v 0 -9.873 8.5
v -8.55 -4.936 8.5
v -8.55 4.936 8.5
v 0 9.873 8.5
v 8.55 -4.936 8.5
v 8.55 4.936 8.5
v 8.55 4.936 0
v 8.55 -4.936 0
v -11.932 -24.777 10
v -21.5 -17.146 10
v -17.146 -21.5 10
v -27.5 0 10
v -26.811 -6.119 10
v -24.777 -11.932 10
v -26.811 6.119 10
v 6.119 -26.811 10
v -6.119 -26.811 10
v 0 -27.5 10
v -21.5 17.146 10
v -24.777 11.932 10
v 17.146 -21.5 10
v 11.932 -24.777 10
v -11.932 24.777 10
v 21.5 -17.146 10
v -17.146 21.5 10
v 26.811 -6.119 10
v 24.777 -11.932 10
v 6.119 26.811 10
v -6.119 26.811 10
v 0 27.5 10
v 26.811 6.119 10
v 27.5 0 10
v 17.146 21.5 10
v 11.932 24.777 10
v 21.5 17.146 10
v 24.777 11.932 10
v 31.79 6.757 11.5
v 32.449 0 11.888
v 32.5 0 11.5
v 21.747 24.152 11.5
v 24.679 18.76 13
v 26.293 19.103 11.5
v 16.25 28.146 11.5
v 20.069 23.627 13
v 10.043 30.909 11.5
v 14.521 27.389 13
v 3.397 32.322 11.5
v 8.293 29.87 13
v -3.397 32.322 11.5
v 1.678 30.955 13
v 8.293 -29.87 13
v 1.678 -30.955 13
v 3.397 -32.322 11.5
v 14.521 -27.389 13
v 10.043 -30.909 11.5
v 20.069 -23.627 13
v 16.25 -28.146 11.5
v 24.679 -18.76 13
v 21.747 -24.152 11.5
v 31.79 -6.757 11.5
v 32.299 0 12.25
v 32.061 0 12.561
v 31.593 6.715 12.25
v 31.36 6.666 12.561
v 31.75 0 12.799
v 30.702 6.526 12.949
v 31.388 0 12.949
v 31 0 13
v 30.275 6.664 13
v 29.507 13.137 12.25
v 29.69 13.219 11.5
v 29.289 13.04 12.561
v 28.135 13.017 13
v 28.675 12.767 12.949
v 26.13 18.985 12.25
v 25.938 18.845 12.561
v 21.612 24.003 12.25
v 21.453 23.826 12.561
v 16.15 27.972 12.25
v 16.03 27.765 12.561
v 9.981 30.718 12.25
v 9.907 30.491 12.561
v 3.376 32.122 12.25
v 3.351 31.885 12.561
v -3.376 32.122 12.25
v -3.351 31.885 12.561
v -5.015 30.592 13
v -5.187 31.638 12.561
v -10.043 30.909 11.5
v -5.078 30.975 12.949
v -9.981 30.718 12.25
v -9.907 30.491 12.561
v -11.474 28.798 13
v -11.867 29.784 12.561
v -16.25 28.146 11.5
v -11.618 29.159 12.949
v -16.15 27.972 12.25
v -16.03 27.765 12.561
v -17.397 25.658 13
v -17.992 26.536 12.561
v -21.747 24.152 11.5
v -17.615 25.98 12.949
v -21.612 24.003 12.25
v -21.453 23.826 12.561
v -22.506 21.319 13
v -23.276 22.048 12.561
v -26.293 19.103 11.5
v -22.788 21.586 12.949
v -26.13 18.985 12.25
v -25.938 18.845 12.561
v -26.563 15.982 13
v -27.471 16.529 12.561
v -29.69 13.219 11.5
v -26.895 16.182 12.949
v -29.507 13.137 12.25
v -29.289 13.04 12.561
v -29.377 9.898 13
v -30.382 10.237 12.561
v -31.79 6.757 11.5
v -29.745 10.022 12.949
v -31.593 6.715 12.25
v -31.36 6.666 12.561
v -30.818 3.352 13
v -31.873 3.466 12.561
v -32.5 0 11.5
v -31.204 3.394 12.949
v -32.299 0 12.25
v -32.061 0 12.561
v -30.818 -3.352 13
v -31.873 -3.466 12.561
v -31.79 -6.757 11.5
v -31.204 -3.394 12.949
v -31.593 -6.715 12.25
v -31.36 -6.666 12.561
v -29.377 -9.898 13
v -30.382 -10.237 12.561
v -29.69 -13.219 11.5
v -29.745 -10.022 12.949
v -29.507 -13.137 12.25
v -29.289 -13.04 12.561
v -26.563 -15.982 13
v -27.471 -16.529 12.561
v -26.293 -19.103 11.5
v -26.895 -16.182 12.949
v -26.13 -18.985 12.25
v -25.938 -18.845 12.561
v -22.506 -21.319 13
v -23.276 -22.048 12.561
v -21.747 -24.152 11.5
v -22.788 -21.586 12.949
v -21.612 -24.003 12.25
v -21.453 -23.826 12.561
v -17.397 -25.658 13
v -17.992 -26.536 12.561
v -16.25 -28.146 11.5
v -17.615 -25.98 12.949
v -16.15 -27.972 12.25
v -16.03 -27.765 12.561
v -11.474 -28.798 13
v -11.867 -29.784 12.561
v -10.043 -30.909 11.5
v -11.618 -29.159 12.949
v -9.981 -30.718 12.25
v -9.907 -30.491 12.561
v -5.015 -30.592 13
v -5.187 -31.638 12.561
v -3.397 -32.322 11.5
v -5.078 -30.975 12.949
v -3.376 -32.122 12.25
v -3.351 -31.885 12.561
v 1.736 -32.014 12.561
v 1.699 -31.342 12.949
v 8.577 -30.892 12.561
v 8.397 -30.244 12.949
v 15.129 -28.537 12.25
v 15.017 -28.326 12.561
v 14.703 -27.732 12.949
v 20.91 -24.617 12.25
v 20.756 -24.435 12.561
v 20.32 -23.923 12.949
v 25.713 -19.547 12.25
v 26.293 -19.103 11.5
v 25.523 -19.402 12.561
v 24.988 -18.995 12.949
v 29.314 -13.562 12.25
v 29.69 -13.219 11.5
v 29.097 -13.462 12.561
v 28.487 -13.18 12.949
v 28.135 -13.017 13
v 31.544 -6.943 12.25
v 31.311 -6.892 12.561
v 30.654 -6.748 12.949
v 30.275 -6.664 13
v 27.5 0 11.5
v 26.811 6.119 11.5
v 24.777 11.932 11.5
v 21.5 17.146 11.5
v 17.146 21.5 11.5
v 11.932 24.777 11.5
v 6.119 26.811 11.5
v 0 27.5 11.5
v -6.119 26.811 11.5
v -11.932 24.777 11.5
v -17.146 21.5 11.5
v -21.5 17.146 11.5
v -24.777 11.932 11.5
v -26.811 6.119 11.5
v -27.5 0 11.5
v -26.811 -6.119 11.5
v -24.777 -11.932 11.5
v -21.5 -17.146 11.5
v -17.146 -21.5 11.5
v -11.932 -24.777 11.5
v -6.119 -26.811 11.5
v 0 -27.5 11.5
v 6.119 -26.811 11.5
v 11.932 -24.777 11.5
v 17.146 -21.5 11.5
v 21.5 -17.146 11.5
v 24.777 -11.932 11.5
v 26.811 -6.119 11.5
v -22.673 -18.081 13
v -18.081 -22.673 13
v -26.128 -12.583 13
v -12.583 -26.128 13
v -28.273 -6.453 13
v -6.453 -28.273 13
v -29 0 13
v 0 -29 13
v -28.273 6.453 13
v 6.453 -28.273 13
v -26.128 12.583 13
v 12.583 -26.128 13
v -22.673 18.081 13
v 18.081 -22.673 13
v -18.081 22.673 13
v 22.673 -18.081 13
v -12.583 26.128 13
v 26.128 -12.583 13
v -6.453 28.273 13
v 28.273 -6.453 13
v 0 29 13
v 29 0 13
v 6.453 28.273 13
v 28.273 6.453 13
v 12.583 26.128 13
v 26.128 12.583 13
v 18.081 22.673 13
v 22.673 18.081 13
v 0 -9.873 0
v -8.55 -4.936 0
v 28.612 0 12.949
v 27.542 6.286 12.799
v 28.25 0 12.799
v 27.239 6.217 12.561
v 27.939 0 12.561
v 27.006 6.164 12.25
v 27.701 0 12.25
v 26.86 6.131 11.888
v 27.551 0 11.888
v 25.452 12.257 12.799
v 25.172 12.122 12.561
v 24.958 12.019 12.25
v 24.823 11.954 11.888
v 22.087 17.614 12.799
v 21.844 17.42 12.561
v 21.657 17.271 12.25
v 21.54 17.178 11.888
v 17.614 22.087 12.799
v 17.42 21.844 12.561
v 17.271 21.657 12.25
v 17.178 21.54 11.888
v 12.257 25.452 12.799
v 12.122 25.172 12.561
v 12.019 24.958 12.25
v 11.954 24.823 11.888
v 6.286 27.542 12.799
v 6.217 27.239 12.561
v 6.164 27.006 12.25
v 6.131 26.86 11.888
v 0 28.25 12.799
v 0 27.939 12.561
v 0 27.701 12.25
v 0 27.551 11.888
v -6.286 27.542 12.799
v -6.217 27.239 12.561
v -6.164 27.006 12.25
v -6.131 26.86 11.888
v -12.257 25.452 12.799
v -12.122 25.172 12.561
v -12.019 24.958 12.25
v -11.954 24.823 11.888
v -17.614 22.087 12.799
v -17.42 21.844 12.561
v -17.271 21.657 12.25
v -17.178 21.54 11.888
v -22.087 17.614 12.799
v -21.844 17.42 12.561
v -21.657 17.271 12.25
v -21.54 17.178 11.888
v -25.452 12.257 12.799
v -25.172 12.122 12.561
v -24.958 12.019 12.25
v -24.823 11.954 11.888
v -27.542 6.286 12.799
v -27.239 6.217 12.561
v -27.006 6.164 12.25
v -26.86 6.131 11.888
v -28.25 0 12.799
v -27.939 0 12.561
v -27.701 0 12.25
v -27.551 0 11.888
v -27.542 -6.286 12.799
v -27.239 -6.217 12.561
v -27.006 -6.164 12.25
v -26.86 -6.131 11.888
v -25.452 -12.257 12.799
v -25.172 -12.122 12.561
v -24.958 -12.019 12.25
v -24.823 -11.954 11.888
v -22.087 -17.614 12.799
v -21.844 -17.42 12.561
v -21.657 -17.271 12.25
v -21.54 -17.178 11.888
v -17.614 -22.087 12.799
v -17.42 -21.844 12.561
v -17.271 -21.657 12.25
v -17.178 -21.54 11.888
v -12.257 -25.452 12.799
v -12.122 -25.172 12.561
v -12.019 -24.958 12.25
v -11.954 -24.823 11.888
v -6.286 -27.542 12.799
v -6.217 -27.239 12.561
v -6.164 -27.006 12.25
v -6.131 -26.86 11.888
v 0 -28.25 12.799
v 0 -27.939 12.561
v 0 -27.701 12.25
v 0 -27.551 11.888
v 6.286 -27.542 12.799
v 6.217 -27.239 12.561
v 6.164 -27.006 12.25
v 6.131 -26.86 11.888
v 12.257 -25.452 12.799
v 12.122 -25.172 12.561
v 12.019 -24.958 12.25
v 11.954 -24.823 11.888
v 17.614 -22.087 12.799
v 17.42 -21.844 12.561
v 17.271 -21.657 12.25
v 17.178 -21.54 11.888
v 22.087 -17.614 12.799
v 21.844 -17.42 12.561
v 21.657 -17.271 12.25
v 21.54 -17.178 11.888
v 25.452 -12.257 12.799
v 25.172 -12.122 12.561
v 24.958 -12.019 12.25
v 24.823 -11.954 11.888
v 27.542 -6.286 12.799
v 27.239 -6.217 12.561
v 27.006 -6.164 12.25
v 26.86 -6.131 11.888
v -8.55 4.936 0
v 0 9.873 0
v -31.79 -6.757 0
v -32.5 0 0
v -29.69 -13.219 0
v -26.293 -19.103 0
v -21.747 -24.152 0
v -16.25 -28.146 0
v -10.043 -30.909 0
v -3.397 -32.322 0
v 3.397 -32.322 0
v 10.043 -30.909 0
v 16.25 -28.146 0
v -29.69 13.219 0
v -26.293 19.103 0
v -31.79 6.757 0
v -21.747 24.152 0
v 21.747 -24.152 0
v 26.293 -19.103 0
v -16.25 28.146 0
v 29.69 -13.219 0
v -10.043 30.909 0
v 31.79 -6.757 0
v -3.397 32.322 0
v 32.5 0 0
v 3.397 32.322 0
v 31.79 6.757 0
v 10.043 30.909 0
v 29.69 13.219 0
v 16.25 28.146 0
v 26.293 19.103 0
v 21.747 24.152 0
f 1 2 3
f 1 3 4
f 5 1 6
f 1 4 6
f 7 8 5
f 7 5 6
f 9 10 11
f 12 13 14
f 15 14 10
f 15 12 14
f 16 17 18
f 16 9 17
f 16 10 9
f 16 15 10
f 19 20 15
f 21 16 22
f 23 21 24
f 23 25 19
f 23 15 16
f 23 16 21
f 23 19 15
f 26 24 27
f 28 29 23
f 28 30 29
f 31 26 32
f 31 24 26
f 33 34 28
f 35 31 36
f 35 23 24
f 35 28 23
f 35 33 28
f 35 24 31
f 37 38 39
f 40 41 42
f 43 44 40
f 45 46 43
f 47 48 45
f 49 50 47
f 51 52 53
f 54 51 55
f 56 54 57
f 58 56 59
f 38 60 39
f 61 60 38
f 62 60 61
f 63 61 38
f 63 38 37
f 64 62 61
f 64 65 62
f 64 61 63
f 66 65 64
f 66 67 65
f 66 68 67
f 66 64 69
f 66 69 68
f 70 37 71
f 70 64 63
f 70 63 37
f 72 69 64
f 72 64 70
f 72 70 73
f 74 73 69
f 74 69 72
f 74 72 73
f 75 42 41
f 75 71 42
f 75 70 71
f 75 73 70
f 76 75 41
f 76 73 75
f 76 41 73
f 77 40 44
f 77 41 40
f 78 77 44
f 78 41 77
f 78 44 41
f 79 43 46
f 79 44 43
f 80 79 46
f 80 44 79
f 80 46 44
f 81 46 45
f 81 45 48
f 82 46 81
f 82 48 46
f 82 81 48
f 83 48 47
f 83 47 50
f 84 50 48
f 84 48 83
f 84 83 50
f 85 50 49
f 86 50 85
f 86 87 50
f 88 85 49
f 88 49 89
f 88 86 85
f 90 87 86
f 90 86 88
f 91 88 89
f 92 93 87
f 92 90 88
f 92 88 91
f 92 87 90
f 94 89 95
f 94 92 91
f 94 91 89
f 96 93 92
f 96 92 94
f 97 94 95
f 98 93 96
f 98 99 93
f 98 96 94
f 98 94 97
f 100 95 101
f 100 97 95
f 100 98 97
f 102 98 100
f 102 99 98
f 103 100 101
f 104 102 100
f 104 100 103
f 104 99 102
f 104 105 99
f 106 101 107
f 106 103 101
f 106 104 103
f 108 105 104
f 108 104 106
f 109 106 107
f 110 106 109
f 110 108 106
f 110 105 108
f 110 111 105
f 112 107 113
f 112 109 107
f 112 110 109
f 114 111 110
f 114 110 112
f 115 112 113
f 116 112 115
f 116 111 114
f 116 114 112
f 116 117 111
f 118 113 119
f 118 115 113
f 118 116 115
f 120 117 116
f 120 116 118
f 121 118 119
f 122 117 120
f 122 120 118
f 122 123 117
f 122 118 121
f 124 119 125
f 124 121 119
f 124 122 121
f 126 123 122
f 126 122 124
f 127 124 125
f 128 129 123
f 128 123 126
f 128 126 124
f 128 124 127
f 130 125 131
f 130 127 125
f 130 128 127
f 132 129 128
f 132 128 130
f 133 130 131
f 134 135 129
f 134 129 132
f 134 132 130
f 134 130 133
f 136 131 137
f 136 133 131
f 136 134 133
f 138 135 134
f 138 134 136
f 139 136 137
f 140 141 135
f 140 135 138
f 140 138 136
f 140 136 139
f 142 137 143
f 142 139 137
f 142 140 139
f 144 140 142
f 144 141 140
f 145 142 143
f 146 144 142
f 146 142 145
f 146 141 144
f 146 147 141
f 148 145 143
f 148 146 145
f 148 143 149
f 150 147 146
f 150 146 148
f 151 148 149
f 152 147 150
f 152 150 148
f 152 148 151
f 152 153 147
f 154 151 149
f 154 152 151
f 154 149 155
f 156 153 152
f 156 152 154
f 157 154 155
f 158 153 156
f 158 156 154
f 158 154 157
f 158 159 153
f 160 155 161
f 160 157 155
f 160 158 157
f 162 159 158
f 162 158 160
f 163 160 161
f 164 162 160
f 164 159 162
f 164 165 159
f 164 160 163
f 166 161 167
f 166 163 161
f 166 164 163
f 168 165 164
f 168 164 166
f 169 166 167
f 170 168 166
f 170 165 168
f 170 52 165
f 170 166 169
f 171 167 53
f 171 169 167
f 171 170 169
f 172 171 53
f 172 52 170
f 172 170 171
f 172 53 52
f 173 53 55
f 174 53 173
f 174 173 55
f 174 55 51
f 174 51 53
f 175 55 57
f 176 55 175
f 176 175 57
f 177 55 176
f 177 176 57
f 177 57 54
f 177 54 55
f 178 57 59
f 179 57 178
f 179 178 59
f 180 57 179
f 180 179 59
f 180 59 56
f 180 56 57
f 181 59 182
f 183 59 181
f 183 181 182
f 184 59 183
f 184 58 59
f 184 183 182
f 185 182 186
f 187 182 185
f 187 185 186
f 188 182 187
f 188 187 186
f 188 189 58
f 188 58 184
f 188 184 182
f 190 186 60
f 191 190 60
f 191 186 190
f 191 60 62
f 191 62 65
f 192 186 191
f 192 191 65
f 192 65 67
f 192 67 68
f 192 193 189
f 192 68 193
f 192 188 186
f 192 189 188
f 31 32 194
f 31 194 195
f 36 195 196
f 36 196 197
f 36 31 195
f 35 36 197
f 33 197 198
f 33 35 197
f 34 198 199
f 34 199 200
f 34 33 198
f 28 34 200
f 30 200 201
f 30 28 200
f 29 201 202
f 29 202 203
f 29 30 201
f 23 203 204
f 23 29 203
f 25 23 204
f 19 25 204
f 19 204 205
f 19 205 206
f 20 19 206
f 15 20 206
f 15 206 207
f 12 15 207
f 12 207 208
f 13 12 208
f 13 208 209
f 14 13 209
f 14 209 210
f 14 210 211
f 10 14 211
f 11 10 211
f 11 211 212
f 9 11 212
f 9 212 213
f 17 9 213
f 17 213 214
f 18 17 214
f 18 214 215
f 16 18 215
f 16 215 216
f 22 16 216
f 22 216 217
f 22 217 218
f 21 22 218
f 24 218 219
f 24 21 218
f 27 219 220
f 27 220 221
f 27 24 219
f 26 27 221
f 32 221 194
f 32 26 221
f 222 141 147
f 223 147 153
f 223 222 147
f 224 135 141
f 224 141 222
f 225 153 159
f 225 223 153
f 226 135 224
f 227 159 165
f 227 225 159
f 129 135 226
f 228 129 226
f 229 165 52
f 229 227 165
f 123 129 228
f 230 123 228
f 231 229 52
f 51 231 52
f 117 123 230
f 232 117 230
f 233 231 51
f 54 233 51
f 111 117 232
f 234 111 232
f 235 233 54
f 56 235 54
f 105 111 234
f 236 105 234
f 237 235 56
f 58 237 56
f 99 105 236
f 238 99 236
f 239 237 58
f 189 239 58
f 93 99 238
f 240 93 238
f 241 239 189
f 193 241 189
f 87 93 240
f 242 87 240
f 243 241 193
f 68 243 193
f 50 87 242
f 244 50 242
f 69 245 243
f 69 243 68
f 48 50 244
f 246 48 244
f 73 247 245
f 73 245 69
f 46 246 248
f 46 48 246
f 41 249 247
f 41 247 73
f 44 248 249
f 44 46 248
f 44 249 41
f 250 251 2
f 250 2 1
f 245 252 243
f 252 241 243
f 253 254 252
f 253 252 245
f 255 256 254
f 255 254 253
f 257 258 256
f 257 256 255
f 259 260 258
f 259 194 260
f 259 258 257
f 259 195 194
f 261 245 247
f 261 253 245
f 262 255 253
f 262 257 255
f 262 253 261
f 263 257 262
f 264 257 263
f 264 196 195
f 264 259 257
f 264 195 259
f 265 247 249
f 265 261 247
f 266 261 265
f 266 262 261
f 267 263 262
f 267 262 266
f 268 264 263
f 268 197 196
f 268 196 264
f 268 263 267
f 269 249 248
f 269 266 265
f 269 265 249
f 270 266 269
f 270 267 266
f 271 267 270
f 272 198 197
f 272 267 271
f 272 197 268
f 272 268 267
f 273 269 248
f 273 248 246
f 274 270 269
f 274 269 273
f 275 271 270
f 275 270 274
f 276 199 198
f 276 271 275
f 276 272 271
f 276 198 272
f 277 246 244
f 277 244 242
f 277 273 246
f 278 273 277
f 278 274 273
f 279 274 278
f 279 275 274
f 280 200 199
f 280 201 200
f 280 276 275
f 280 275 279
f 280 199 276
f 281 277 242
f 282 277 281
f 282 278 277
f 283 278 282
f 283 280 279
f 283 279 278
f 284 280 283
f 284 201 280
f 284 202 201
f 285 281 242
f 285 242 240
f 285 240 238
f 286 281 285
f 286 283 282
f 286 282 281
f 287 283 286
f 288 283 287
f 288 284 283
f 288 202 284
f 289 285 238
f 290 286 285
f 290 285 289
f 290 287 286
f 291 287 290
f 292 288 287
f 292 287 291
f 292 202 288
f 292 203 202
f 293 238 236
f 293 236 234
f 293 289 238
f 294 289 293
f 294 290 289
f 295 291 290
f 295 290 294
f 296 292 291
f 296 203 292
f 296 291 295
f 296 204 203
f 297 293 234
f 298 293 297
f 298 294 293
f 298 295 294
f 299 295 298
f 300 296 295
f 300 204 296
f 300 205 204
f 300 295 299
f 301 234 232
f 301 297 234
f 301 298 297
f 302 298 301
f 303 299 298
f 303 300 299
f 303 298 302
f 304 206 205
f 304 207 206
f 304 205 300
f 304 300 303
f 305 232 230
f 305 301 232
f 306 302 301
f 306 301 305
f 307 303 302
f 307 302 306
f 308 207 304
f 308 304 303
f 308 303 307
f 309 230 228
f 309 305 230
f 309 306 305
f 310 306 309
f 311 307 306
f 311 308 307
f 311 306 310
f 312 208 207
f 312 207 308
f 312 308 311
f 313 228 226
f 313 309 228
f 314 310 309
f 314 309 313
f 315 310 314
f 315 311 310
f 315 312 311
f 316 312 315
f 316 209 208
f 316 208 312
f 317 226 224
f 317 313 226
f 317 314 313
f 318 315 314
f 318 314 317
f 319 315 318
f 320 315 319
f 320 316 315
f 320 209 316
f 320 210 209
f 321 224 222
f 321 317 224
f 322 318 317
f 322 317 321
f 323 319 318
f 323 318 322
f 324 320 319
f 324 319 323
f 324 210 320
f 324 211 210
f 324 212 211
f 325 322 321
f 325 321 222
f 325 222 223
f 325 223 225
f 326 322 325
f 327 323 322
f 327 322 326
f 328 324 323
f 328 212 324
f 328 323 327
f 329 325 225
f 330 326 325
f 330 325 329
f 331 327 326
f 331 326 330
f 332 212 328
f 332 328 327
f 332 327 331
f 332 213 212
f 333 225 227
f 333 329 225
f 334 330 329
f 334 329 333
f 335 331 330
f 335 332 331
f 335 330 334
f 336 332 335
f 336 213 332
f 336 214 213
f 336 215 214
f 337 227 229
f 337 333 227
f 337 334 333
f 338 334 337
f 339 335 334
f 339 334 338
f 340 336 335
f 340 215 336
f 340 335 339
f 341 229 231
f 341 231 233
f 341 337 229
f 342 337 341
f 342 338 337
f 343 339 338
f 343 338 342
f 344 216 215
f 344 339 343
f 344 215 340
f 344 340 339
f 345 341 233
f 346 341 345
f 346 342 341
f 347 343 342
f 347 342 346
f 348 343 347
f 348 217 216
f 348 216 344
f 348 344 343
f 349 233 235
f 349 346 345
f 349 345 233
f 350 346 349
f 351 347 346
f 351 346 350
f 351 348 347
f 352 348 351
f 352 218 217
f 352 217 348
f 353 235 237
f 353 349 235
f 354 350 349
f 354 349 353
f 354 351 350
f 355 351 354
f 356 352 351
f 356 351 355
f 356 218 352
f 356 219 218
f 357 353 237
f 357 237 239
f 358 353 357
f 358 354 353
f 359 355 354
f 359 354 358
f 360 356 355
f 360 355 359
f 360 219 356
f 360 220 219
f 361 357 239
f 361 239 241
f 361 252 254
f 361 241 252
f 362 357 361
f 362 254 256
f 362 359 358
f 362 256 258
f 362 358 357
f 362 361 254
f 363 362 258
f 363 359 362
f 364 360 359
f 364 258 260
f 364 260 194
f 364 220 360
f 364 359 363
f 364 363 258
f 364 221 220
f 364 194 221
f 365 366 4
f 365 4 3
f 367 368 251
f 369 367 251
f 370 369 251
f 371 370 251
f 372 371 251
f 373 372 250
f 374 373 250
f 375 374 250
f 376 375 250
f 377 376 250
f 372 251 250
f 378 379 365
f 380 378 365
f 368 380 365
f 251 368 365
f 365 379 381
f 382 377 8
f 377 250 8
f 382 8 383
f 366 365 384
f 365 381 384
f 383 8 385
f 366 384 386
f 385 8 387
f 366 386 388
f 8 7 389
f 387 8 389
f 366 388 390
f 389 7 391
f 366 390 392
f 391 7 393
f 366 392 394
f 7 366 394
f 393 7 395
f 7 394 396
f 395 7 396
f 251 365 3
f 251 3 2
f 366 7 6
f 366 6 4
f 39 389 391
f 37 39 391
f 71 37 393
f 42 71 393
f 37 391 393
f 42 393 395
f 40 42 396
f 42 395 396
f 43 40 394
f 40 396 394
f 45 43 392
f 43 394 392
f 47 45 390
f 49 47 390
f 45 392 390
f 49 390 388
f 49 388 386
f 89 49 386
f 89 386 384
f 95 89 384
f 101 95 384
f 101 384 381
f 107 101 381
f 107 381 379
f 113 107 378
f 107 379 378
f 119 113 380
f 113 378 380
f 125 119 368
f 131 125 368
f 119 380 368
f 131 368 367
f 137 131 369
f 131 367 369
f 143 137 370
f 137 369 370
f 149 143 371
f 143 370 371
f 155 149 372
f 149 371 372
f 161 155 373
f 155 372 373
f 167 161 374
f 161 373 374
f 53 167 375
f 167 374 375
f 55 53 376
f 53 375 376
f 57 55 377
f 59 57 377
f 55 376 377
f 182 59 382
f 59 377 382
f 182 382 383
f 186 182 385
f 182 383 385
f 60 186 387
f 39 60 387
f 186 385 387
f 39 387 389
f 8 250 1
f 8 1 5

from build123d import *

# Parameters (mm, degrees)
F0_R     = 32.5
F0_R_2   = 27.5
F1_DEPTH = 10
F2_DEPTH = 8.5
F3_DEPTH = 13
F4_R     = 1.5


with BuildPart() as f1:
    # F0 (on Top) → F1 (new body)
    with BuildSketch(Plane.XY):
        Circle(F0_R)
        Circle(F0_R_2, mode=Mode.SUBTRACT)
        Circle(F0_R_2)
        Polygon((-8.55, 4.9363448016), (0, 9.8726896031), (8.55, 4.9363448016), (8.55, -4.9363448016), (0, -9.8726896031), (-8.55, -4.9363448016), align=None, mode=Mode.SUBTRACT)
        Polygon((8.55, 4.9363448016), (0, 9.8726896031), (-8.55, 4.9363448016), (-8.55, -4.9363448016), (0, -9.8726896031), (8.55, -4.9363448016), align=None)
    extrude(amount=F1_DEPTH)

    # F0 (on Top) → F2 (cut)
    with BuildSketch(Plane.XY):
        Polygon((8.55, 4.9363448016), (0, 9.8726896031), (-8.55, 4.9363448016), (-8.55, -4.9363448016), (0, -9.8726896031), (8.55, -4.9363448016), align=None)
    extrude(amount=F2_DEPTH, mode=Mode.SUBTRACT)

    # F0 (on Top) → F3 (join)
    with BuildSketch(Plane.XY):
        Circle(F0_R)
        Circle(F0_R_2, mode=Mode.SUBTRACT)
    extrude(amount=F3_DEPTH)

    # F4
    f4_edges = [f1.edges().sort_by_distance(p)[0] for p in [
        (-32.5, 0, 13),
        (-27.5, 0, 13),
    ]]
    fillet(f4_edges, radius=F4_R)


solid = f1.part
